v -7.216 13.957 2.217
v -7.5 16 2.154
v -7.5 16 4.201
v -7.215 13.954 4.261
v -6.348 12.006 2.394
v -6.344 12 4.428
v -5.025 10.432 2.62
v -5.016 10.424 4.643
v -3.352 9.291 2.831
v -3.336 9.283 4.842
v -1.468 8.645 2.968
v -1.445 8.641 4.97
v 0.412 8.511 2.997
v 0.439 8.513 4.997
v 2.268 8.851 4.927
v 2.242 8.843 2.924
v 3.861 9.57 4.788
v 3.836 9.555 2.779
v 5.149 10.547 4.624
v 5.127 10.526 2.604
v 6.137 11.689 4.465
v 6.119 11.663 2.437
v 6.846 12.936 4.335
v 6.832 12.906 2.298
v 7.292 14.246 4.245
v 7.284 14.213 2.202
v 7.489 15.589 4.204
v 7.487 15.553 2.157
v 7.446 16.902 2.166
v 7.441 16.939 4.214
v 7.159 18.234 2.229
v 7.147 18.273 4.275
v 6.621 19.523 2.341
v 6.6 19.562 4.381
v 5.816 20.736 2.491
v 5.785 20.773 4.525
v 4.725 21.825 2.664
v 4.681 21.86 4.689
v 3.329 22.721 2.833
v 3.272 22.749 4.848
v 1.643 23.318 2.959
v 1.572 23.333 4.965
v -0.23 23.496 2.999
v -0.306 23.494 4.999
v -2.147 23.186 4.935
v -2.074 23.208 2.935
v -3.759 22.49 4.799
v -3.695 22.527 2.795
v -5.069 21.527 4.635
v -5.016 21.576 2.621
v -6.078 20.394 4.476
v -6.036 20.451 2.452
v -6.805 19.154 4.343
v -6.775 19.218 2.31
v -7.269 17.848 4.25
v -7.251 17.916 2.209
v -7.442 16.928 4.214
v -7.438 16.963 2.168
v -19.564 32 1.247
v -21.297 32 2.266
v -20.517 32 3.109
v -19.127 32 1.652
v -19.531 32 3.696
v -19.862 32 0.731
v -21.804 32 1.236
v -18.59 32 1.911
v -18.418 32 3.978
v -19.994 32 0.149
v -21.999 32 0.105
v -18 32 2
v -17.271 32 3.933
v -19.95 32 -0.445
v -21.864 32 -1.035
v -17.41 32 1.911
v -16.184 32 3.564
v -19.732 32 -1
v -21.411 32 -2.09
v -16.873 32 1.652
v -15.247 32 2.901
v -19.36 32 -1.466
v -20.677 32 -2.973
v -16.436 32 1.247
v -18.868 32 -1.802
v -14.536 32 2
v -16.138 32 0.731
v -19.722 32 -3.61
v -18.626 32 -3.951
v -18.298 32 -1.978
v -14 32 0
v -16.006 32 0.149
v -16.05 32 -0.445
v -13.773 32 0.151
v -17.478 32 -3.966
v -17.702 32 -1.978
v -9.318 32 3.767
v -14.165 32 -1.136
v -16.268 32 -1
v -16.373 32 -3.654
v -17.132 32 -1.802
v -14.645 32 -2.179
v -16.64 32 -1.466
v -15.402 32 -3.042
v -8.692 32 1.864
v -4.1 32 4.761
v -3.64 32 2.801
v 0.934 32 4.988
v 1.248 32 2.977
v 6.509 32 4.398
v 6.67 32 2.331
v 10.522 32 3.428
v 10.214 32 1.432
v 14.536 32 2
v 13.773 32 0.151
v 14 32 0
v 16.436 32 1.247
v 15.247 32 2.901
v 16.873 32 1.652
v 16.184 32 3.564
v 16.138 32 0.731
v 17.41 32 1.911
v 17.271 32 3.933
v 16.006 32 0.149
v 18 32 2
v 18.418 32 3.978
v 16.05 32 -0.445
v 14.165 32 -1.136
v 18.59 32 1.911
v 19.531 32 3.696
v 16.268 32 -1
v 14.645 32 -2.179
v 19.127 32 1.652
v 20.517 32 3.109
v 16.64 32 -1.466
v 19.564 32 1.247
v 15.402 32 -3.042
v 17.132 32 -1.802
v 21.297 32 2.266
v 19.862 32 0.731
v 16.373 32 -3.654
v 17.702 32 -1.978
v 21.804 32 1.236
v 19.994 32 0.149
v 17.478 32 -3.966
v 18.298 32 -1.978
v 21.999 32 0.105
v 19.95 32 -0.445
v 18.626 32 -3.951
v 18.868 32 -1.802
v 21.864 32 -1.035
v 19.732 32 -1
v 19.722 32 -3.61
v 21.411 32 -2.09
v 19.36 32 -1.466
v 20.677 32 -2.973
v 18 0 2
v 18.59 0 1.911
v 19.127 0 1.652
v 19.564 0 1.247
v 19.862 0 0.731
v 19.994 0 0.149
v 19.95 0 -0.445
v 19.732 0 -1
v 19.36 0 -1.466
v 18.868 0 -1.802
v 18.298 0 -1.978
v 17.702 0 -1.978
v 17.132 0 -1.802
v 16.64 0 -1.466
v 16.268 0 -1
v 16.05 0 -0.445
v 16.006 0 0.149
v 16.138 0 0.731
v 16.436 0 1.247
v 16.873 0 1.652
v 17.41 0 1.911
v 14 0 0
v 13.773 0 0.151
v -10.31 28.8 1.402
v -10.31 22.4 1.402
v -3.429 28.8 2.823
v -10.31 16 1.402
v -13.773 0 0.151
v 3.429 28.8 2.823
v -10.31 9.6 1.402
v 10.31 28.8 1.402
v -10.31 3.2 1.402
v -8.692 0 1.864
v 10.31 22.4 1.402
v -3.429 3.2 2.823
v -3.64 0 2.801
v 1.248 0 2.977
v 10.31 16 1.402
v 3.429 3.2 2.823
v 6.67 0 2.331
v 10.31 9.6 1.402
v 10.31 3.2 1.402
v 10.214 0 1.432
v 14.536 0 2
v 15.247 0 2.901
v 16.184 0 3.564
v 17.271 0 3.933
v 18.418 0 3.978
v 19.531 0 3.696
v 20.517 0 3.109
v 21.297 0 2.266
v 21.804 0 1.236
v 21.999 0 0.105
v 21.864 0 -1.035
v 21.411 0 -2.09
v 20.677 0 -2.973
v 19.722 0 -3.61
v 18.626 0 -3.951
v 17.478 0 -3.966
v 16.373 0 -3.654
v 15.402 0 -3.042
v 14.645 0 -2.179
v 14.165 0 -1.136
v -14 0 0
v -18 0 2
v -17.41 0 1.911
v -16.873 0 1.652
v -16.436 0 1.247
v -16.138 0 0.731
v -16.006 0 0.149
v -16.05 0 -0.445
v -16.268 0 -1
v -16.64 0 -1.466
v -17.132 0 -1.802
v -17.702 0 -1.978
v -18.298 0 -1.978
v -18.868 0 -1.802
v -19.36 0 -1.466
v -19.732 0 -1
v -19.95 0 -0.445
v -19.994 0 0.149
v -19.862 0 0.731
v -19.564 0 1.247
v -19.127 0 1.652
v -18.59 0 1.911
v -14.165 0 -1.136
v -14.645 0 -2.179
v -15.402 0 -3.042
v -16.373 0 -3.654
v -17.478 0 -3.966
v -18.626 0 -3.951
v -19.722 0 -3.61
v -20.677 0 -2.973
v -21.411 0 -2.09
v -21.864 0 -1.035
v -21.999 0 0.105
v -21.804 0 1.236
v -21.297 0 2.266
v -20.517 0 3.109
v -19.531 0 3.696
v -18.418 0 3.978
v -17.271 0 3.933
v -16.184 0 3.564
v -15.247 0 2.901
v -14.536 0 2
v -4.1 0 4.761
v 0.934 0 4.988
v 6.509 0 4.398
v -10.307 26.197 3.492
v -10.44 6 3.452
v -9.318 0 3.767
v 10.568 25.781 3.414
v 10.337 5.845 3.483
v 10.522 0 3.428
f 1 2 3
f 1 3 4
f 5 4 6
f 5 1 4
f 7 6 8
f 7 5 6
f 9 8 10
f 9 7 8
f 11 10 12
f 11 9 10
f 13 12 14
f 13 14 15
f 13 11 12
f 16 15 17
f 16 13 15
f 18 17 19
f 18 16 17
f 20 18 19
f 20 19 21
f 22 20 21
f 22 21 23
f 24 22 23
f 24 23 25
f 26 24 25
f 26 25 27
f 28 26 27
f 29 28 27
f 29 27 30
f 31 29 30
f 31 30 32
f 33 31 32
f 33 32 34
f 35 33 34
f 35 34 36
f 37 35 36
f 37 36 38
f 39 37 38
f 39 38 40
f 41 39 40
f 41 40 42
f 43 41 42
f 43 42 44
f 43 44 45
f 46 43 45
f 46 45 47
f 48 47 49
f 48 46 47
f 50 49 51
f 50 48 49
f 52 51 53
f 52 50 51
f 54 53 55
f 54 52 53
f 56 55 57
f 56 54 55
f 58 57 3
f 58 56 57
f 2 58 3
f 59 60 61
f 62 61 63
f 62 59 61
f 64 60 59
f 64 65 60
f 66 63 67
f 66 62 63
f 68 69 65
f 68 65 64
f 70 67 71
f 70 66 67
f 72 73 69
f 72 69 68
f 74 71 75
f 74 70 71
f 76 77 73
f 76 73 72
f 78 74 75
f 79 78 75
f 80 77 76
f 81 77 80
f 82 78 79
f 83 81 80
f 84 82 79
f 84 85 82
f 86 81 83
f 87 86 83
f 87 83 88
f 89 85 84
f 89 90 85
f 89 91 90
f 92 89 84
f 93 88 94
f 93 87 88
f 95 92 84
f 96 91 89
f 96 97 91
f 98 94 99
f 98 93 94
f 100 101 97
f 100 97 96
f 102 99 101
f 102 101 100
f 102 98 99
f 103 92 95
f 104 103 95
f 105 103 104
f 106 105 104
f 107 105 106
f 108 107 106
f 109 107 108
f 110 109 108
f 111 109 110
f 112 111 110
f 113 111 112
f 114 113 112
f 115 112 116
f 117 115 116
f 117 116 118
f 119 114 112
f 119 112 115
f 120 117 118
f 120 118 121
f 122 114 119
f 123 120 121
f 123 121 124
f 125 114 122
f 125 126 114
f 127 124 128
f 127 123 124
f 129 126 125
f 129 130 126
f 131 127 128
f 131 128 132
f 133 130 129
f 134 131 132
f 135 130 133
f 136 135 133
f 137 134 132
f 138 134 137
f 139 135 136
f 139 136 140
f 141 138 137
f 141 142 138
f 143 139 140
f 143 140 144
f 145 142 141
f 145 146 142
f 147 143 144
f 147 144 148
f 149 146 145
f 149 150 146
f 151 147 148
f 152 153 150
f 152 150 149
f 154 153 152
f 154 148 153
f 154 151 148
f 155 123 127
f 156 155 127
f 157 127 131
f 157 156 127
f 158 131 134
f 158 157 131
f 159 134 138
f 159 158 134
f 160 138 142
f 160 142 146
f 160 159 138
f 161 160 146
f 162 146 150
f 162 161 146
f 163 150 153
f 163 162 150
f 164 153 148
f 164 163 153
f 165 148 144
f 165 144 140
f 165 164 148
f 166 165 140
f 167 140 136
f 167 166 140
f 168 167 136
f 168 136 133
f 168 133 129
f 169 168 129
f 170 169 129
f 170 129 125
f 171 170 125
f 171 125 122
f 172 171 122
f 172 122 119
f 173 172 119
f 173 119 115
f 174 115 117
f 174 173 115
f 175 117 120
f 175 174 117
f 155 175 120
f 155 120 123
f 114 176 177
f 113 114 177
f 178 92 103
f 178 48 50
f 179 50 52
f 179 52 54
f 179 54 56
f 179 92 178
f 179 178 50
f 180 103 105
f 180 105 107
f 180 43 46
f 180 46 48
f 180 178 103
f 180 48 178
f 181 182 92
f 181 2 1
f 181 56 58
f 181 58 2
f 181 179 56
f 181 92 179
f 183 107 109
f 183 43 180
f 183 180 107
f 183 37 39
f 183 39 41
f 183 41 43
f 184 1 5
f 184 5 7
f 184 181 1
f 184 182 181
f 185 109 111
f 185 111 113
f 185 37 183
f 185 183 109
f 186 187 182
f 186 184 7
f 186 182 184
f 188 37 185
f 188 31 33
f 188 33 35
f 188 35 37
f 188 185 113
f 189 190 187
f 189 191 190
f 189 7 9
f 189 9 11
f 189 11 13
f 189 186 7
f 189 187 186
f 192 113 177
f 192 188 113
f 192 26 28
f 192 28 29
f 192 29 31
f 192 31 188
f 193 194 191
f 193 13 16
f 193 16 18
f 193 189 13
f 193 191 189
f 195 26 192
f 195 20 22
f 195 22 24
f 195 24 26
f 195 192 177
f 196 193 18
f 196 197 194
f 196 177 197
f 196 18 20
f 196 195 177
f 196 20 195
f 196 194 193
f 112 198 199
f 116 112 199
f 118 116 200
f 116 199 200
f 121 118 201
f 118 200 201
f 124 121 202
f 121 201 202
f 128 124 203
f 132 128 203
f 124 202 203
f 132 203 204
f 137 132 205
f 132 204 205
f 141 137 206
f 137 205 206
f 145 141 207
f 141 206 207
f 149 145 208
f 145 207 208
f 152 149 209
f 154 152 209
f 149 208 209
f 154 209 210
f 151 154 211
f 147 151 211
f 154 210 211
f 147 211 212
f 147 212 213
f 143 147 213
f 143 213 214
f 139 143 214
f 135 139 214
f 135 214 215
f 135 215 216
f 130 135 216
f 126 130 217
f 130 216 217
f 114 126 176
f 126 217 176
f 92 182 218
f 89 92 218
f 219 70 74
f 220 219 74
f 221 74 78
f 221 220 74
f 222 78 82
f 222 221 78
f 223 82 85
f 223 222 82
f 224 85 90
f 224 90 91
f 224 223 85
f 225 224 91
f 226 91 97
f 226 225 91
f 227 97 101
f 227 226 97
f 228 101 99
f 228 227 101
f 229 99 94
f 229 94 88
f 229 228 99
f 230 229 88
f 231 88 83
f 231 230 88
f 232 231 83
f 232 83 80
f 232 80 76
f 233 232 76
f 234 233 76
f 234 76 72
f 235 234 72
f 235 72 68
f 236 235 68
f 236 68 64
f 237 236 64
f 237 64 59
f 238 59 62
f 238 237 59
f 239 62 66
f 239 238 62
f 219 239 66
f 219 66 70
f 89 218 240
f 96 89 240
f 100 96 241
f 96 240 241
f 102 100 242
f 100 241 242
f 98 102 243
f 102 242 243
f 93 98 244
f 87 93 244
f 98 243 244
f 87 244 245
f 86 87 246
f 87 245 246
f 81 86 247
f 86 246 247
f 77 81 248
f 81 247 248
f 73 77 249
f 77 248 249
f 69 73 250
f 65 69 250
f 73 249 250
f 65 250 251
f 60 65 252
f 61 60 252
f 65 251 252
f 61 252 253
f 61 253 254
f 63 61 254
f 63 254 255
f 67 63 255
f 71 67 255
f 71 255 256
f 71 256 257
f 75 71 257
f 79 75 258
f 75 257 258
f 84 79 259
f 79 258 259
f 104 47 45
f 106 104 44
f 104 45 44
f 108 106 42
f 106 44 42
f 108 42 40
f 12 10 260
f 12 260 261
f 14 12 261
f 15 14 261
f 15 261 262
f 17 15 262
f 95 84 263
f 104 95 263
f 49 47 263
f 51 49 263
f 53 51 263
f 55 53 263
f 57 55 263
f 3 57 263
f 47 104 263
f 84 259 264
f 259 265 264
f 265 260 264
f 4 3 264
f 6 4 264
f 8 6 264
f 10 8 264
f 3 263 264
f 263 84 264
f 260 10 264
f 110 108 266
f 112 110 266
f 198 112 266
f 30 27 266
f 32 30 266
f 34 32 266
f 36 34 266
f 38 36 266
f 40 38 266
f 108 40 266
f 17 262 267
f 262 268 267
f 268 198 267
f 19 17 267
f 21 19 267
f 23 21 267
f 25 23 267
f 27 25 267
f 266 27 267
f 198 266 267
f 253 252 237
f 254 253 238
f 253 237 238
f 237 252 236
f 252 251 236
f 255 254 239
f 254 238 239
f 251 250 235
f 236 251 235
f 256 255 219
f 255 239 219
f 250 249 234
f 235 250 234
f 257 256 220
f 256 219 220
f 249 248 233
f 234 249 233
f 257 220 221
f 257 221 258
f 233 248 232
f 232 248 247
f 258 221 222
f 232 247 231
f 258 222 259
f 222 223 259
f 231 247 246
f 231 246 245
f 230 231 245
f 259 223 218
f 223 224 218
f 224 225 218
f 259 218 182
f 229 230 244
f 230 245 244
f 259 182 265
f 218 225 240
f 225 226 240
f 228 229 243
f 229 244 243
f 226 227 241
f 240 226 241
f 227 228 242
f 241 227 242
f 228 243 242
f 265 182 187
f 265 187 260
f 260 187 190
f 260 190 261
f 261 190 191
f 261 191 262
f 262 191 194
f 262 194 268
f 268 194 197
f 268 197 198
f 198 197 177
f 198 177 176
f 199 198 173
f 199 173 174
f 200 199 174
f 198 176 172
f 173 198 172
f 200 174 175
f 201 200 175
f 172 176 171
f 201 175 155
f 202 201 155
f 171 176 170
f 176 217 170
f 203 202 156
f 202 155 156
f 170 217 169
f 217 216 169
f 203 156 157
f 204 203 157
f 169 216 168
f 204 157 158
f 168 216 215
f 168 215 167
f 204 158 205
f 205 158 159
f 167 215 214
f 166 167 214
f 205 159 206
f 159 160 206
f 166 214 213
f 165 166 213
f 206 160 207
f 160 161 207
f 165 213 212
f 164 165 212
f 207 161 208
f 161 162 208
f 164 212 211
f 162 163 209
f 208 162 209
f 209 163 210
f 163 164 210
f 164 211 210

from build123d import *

# Parameters (mm, degrees)
SKETCH1_R           = 2
BOSS_EXTRUDE1_DEPTH = 32
SKETCH2_R           = 7.5
CUT_EXTRUDE1_DEPTH  = 25


with BuildPart() as part:
    # Sketch1 → Boss-Extrude1 (new body)
    with BuildSketch(Plane(origin=(0, 0, 0), x_dir=(1, 0, 0), z_dir=(0, 1, 0))):
        with BuildLine():
            Line((-13.772808121, -0.151299578), (-14, 0))
            ThreePointArc((-14, 0), (-21.863703305, 1.03527618), (-14.535898385, -2))
            add(Edge.make_bspline(
                [(-14.535898385, -2), (0, -8), (14.535898385, -2)],
                knots=[0, 0, 0, 1, 1, 1], degree=2))
            ThreePointArc((14.535898385, -2), (21.863703305, 1.03527618), (14, 0))
            Line((14, 0), (13.772808121, -0.151299578))
            add(Edge.make_bspline(
                [(-13.772808121, -0.151299578), (-13.200157242, -0.38767336), (-12.03616489, -0.83828907), (-9.734990662, -1.609651667), (-6.861177209, -2.35105477), (-3.427724467, -2.882094844), (0, -3.058952578), (3.427724467, -2.882094844), (6.861177209, -2.35105477), (9.734990662, -1.609651667), (12.03616489, -0.83828907), (13.200157242, -0.38767336), (13.772808121, -0.151299578)],
                knots=[0, 0, 0, 0, 0.0625, 0.125, 0.25, 0.375, 0.5, 0.625, 0.75, 0.875, 0.9375, 1, 1, 1, 1], degree=3))
        make_face()
        with Locations(Location((-18, 0, 0), (0, 0, 270))):
            Circle(SKETCH1_R, mode=Mode.SUBTRACT)
        with Locations(Location((18, 0, 0), (0, 0, 270))):
            Circle(SKETCH1_R, mode=Mode.SUBTRACT)
    extrude(amount=BOSS_EXTRUDE1_DEPTH)

    # Sketch2 → Cut-Extrude1 (cut)
    with BuildSketch(Plane.XY):
        with Locations(Location((0, 16, 0), (0, 0, 180))):
            Circle(SKETCH2_R)
    extrude(amount=CUT_EXTRUDE1_DEPTH, mode=Mode.SUBTRACT)


solid = part.part
